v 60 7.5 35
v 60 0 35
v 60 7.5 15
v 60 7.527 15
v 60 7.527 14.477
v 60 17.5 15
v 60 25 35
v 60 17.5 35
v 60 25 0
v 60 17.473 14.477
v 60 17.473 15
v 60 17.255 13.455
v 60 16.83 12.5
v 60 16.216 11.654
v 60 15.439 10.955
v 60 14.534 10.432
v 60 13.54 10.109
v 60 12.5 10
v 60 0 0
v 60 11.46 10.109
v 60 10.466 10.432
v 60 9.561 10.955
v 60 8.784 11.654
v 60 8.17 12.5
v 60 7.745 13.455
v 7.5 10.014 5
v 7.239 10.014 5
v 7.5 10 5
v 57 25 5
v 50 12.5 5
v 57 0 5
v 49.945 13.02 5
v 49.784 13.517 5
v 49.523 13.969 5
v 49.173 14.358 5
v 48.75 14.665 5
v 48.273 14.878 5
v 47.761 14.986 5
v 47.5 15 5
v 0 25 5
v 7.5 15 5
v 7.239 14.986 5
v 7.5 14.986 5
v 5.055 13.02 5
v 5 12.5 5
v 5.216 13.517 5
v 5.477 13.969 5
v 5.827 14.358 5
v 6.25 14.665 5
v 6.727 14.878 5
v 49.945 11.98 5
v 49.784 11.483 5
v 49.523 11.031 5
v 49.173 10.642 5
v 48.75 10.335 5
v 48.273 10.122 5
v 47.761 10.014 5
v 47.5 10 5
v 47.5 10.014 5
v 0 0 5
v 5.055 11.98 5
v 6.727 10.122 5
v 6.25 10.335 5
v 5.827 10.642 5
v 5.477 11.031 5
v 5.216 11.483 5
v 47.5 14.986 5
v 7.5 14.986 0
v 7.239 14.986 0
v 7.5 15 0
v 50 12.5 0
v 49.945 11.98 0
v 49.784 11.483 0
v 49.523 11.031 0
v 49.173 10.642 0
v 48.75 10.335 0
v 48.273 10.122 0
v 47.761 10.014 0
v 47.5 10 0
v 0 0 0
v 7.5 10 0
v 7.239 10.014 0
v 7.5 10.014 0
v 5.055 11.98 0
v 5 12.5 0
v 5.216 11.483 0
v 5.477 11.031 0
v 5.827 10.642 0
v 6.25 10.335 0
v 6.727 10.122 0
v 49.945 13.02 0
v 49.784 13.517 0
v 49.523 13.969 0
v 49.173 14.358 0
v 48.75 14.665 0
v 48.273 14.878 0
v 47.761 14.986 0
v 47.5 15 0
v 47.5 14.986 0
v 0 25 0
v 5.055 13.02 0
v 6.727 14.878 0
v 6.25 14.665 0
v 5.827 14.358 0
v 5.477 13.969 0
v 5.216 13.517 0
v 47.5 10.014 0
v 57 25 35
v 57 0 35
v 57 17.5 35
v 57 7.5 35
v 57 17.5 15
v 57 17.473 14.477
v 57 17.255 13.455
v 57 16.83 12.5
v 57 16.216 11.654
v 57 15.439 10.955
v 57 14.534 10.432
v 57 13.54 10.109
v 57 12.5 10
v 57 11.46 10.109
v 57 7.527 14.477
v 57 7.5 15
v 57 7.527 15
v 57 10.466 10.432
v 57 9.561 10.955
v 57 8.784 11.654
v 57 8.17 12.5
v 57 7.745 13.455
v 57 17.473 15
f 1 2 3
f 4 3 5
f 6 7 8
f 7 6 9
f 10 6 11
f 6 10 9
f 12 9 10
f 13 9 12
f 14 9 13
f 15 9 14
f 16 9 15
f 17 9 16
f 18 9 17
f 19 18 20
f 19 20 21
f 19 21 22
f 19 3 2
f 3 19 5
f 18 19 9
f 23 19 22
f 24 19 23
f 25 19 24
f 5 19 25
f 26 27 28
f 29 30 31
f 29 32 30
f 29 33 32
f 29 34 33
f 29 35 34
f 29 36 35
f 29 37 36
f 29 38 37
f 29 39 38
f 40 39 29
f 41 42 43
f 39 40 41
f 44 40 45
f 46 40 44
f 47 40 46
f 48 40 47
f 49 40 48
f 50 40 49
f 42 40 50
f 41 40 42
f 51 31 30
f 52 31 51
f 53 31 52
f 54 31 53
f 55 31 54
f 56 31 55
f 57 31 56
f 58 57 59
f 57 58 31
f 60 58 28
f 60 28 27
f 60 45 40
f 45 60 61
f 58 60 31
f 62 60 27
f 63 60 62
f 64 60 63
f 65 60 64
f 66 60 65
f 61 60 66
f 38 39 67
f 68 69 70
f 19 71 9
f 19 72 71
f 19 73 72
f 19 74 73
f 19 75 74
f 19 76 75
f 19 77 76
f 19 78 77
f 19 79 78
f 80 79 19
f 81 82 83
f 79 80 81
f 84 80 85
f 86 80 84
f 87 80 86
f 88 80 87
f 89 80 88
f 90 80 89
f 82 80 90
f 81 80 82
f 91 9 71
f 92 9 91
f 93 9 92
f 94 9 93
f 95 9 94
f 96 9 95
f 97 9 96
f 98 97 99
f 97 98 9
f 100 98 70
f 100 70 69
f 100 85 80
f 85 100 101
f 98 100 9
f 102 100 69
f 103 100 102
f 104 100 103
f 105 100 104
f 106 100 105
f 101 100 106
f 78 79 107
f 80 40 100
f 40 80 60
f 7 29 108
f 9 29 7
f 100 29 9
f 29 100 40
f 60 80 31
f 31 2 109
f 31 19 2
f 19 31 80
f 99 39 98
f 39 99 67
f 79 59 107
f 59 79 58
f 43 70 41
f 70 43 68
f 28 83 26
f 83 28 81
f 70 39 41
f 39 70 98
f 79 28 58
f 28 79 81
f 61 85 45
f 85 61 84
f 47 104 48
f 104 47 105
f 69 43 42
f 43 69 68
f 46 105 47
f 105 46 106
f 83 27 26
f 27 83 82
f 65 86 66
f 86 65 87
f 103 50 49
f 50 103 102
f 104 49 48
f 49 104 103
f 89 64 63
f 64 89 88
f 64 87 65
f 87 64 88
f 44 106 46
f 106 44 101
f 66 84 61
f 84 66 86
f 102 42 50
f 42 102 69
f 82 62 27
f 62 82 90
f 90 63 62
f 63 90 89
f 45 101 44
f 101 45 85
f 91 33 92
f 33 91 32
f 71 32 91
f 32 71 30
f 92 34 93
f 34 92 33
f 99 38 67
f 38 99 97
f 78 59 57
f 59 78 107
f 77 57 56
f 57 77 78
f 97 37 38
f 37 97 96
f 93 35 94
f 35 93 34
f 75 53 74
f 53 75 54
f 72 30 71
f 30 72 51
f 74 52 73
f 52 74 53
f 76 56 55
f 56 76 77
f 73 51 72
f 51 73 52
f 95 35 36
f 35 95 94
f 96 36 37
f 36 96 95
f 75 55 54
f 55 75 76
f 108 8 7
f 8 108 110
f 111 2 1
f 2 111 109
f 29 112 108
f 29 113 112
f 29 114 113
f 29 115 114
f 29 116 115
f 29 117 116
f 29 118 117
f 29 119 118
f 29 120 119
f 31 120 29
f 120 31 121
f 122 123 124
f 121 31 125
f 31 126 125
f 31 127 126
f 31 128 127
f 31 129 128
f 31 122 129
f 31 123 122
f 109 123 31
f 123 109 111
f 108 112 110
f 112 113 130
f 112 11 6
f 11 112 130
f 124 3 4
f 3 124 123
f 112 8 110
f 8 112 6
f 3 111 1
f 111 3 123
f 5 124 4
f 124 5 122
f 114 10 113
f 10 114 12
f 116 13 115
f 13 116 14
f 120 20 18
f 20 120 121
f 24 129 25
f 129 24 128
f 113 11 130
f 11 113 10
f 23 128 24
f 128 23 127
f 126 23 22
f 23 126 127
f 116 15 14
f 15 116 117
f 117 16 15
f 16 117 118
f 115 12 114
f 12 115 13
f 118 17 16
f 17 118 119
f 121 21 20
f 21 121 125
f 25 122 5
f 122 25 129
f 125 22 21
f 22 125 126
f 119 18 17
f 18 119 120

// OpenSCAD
// Author: Charlie Snyder
// Twitter Handle: @mjrsnyder

$fn=30;

length=60;
width=25;
switchRadius=5;
switchArmLength=30;

module riser_base(length, width) {
    difference () {
        cube([length,width,5]);
        translate ([7.5,(width -5)/2,0]) {
            cube([length - 20,5,5]);
        }
        translate([7.5,width/2,0]){
            cylinder(r=2.5, h=5);
        }
        translate([length -12.5 ,width/2,0]){
            cylinder(r=2.5, h=5);
        }
    }
}

module switch_holder(width, length, holeRadius) {
    difference(){
        cube([length, width, 3]);
        translate([holeRadius+5, (width - (holeRadius*2))/2]) {
            cube([length - 5, holeRadius*2, 3]);
        }
        translate([holeRadius+5 ,width/2]){
            cylinder(r=holeRadius, h=3);
        }
    }
}



riser_base(length,width);

translate([length,0,5]) {
    rotate(a=270, v=[0,1,0]) {
        switch_holder(width, switchArmLength, switchRadius);
    }
}
